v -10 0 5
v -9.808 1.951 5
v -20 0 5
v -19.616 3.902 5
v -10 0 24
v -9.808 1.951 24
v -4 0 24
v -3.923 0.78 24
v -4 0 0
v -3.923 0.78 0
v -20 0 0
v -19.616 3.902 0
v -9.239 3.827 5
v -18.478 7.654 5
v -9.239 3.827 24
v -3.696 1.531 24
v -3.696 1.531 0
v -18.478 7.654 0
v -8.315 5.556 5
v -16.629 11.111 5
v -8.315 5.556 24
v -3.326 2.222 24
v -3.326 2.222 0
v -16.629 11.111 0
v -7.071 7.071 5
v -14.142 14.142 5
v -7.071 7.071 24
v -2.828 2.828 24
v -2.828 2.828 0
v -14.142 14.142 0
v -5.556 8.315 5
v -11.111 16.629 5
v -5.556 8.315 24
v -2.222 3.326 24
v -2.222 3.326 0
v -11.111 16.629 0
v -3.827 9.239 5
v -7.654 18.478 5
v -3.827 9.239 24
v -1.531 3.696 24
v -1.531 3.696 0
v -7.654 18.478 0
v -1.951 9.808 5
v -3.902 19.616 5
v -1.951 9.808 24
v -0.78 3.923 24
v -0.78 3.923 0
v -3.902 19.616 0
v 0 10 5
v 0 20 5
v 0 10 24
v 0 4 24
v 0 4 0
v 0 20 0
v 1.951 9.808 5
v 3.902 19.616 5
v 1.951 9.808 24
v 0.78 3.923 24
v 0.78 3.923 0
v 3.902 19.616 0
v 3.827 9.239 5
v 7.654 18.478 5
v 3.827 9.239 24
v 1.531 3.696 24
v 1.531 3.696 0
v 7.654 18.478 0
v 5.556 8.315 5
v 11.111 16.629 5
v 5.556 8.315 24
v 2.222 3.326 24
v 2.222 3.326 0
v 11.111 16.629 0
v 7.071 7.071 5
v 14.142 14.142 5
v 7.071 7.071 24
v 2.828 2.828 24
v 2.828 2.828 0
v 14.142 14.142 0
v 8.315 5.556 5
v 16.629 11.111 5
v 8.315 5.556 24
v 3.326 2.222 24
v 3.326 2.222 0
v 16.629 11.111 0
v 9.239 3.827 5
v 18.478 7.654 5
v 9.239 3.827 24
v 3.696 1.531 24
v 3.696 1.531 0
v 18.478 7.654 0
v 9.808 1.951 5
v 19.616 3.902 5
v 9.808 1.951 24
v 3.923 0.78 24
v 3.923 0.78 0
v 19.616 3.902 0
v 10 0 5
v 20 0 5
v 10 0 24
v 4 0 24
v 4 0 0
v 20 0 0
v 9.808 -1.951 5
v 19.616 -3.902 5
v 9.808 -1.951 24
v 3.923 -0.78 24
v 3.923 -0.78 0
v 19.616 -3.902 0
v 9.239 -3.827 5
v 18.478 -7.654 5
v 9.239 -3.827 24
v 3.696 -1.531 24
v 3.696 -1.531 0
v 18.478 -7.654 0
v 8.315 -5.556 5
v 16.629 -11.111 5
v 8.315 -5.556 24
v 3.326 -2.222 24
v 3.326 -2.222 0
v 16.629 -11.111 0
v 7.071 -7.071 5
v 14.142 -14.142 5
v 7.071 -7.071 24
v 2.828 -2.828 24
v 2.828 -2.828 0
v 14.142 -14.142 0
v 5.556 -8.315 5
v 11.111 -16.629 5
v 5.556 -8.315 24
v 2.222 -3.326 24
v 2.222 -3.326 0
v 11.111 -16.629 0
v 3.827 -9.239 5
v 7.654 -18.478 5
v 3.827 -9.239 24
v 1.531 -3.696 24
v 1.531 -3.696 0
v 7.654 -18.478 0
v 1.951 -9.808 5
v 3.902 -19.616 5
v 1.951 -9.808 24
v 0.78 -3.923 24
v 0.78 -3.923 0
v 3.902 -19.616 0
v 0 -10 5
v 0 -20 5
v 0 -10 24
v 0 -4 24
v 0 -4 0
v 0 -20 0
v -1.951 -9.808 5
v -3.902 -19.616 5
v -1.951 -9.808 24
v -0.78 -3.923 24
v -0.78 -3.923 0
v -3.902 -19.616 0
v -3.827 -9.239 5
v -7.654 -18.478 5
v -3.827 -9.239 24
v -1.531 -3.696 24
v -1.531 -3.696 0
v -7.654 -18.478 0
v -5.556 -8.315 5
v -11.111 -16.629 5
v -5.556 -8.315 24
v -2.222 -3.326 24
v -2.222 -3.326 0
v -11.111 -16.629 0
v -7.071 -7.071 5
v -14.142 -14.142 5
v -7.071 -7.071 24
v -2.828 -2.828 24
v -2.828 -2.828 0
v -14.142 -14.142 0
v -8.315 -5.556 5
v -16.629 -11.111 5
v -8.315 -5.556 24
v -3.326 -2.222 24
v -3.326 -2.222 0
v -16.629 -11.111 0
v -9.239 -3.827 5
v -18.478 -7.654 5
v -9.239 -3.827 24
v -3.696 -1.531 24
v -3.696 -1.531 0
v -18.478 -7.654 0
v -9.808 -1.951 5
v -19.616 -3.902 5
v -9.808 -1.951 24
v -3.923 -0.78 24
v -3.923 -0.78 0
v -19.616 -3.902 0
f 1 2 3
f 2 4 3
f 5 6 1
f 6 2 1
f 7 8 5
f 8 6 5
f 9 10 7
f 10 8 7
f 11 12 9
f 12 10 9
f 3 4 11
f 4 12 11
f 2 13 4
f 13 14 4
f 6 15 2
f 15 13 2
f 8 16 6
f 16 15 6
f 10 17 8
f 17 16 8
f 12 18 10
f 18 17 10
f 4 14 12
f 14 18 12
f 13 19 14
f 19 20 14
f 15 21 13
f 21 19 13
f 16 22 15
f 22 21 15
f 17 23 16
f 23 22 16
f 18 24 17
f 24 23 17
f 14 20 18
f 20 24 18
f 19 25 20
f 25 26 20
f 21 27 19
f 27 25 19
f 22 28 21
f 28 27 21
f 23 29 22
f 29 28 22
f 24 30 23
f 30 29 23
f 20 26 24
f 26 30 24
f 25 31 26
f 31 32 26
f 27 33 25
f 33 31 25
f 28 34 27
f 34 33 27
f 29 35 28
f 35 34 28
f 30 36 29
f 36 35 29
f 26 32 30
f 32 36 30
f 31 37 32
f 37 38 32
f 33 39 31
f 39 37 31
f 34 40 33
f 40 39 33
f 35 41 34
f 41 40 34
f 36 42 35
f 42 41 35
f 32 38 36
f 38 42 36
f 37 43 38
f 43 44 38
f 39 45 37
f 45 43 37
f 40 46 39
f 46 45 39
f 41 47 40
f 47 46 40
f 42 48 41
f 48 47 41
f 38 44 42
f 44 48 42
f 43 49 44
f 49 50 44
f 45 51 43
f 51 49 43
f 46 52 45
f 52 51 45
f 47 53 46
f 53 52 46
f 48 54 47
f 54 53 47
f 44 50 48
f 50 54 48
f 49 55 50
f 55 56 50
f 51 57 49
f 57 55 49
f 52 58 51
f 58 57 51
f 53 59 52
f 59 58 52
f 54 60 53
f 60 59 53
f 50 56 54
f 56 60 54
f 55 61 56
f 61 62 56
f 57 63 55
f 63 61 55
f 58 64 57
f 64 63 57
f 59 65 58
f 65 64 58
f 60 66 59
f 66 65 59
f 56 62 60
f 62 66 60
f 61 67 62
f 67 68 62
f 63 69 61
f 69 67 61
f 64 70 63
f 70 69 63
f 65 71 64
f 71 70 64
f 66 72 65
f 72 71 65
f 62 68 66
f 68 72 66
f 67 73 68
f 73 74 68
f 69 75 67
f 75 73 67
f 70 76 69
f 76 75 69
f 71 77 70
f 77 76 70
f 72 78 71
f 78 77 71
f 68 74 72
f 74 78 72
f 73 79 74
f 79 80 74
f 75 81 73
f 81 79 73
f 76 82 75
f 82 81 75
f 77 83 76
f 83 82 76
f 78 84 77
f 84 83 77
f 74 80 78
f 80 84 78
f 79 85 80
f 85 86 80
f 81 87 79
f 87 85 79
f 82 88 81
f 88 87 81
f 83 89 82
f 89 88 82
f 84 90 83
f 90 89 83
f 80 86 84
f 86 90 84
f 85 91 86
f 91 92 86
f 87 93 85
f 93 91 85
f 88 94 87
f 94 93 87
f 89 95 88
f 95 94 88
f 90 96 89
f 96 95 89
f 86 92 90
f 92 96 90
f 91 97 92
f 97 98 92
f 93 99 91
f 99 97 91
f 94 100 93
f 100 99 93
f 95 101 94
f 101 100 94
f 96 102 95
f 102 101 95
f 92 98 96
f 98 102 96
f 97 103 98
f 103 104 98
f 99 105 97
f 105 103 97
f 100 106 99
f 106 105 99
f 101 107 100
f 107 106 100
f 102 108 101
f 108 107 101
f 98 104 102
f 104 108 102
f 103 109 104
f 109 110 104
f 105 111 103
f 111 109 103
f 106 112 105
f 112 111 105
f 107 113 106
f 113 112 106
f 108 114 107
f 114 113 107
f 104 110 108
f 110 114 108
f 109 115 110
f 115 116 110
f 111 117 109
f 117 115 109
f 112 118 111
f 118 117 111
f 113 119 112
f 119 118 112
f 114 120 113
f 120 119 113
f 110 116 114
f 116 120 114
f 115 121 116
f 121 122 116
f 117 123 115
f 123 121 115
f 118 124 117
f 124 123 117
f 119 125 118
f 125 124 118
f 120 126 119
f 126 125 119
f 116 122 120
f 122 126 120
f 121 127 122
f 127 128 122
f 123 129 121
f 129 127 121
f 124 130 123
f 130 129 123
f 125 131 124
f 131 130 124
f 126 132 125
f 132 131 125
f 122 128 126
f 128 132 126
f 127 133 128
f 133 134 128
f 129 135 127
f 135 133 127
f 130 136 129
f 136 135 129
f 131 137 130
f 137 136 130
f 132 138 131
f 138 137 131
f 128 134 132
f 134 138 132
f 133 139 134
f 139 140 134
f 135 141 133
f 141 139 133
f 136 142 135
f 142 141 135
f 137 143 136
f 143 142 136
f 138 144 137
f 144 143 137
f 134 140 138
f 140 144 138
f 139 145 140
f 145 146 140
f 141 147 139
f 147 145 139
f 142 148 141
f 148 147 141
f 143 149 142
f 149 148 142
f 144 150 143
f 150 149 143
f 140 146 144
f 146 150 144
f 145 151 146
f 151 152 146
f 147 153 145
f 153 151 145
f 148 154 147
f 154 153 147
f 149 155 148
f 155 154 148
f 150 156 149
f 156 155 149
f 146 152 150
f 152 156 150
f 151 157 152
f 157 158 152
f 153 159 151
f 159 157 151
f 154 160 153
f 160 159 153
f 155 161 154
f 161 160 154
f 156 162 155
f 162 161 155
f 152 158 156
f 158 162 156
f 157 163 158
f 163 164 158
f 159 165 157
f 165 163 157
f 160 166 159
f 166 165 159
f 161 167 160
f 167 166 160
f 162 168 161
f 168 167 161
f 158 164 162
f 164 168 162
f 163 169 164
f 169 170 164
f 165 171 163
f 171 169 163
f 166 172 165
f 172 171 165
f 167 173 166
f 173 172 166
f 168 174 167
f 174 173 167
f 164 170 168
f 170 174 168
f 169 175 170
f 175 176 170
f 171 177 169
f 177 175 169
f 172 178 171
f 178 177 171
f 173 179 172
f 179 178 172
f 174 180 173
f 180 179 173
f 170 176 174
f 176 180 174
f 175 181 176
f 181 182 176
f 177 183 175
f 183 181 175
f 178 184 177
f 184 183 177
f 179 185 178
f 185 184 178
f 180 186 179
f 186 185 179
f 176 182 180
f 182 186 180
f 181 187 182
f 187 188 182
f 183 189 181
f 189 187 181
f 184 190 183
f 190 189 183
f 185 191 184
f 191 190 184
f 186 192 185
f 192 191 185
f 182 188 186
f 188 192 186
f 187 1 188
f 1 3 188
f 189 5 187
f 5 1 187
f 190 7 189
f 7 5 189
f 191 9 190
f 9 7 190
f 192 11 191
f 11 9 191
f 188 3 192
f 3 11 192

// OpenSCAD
$fn = 32;

// ----------------------------------------------------------------------
// Revolved part: flanged bushing R20
// ----------------------------------------------------------------------

// --- parameters (mm) ---
bore_r = 4;               // bore radius
flange_r = 20;            // flange radius
flange_h = 5;             // flange thickness
sleeve_r = 10;            // sleeve radius
total_h = 24;             // overall height
revolve_angle = 360;      // revolve sweep, degrees

bore_d = 2 * bore_r;
flange_d = 2 * flange_r;
sleeve_d = 2 * sleeve_r;

profile = [[4, 0], [20, 0], [20, 5], [10, 5], [10, 24], [4, 24]];  // primary outline, 6 points, counter clockwise

// --- the one profile operation ---
rotate_extrude(angle = revolve_angle) polygon(points = profile);
